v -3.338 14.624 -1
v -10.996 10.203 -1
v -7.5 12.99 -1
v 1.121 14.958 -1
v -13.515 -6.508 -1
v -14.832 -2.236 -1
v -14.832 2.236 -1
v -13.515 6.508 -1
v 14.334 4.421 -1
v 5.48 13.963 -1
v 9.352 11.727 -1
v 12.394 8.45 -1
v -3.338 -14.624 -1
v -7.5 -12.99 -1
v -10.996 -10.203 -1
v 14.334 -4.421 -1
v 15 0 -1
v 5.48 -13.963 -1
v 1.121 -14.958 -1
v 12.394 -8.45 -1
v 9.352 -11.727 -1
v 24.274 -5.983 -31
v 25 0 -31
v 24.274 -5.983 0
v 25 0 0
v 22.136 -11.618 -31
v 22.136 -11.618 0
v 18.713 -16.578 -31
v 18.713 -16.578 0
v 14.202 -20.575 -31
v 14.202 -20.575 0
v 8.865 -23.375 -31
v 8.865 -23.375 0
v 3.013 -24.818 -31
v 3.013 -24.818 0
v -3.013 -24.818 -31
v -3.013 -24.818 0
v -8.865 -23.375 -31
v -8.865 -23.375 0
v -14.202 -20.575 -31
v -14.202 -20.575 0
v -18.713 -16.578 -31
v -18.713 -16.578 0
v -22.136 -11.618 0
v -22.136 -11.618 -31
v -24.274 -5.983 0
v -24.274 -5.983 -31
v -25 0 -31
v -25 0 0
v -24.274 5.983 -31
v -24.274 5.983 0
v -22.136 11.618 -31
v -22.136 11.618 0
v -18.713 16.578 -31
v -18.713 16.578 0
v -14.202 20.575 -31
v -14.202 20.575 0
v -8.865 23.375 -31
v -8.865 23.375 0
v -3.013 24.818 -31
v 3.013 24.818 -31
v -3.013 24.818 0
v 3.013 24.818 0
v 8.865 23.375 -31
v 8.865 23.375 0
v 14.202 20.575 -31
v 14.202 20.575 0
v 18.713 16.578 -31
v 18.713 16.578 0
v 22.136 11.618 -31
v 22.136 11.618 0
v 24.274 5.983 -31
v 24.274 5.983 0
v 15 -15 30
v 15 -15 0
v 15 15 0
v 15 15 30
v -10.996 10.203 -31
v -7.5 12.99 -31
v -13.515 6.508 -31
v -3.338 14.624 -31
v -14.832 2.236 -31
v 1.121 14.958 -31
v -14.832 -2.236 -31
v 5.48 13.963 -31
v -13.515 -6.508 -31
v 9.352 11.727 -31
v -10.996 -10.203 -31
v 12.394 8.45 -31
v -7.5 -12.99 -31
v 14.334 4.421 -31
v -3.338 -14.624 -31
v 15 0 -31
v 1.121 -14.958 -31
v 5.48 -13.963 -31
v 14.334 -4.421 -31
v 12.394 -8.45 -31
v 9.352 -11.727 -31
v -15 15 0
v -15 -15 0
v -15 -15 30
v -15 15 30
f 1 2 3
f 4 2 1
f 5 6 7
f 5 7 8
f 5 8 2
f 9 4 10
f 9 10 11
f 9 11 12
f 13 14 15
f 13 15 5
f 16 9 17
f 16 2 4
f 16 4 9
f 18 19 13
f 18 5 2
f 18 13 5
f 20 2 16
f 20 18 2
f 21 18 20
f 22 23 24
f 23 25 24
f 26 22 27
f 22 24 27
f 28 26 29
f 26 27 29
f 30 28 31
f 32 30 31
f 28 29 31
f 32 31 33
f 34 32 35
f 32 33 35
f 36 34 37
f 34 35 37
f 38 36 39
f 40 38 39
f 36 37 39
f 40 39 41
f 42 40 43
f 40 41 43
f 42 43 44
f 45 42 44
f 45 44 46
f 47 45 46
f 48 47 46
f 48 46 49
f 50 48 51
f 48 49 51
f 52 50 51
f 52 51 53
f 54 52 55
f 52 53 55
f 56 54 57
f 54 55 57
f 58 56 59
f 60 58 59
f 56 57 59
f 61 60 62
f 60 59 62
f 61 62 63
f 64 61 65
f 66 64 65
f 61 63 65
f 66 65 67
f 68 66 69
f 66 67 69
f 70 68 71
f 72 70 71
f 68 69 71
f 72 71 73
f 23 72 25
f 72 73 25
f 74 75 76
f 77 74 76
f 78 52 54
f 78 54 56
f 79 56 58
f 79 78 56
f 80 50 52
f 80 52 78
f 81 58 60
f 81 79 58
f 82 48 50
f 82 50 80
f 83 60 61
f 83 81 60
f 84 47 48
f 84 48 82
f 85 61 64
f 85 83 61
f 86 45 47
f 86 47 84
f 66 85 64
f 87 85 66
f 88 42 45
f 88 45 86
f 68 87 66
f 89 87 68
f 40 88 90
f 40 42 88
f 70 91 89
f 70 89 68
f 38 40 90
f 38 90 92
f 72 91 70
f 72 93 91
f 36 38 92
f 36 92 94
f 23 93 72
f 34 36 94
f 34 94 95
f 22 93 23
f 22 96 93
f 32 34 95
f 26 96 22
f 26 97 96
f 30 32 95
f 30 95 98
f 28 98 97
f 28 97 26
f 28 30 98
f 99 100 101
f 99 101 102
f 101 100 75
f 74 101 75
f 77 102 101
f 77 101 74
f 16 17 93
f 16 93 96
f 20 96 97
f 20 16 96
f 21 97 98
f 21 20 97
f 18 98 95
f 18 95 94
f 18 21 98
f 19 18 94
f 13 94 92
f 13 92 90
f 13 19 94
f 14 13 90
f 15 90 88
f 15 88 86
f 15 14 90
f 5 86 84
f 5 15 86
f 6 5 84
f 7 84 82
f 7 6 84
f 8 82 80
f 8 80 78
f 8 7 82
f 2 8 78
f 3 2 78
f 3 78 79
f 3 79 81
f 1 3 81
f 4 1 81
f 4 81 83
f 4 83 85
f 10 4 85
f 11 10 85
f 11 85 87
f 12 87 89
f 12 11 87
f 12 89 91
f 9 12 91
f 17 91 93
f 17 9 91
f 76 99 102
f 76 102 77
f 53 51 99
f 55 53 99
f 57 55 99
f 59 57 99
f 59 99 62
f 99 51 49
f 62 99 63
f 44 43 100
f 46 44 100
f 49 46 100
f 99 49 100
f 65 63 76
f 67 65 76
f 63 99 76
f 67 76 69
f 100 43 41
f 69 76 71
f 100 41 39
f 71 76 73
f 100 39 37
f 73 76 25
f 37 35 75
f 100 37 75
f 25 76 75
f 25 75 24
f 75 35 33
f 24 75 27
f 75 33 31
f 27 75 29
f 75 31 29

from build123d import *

# Parameters (mm, degrees)
F0_W     = 30
F0_H     = 30
F1_DEPTH = 30
F2_R     = 25
F3_DEPTH = 1
F4_R     = 25
F4_R_2   = 15
F5_DEPTH = 30


with BuildPart() as f1:
    # F0 (on Top) → F1 (new body)
    with BuildSketch(Plane.XY):
        Rectangle(F0_W, F0_H)
    extrude(amount=F1_DEPTH)

    # F2 (on face) → F3 (join)
    with BuildSketch(Plane(origin=(0, 0, 0), x_dir=(1, 0, 0), z_dir=(0, 0, -1))):
        Circle(F2_R)
        Polygon((15, 15), (15, 0), (15, -15), (0, -15), (-15, -15), (-15, 3.9e-09), (-15, 15), (0, 15), align=None, mode=Mode.SUBTRACT)
        with BuildLine():
            ThreePointArc((0, -15), (10.6066017178, -10.6066017178), (15, 0))
            ThreePointArc((15, 0), (10.6066017178, 10.6066017178), (0, 15))
            ThreePointArc((0, 15), (-10.6066017164, 10.6066017192), (-15, 3.9e-09))
            ThreePointArc((-15, 3.9e-09), (-10.6066017192, -10.6066017164), (0, -15))
        make_face()
        with BuildLine():
            ThreePointArc((-15, 3.9e-09), (-10.6066017164, 10.6066017192), (0, 15))
            Line((0, 15), (-15, 15))
            Line((-15, 15), (-15, 3.9e-09))
        make_face()
        with BuildLine():
            ThreePointArc((0, 15), (10.6066017178, 10.6066017178), (15, 0))
            Line((15, 0), (15, 15))
            Line((15, 15), (0, 15))
        make_face()
        with BuildLine():
            Line((15, -15), (15, 0))
            ThreePointArc((15, 0), (10.6066017178, -10.6066017178), (0, -15))
            Line((0, -15), (15, -15))
        make_face()
        with BuildLine():
            Line((-15, -15), (0, -15))
            ThreePointArc((0, -15), (-10.6066017192, -10.6066017164), (-15, 3.9e-09))
            Line((-15, 3.9e-09), (-15, -15))
        make_face()
    extrude(amount=F3_DEPTH)

    # F4 (on face) → F5 (join)
    with BuildSketch(Plane(origin=(0, 0, -1), x_dir=(1, 0, 0), z_dir=(0, 0, -1))):
        Circle(F4_R)
        Circle(F4_R_2, mode=Mode.SUBTRACT)
    extrude(amount=F5_DEPTH)


solid = f1.part
